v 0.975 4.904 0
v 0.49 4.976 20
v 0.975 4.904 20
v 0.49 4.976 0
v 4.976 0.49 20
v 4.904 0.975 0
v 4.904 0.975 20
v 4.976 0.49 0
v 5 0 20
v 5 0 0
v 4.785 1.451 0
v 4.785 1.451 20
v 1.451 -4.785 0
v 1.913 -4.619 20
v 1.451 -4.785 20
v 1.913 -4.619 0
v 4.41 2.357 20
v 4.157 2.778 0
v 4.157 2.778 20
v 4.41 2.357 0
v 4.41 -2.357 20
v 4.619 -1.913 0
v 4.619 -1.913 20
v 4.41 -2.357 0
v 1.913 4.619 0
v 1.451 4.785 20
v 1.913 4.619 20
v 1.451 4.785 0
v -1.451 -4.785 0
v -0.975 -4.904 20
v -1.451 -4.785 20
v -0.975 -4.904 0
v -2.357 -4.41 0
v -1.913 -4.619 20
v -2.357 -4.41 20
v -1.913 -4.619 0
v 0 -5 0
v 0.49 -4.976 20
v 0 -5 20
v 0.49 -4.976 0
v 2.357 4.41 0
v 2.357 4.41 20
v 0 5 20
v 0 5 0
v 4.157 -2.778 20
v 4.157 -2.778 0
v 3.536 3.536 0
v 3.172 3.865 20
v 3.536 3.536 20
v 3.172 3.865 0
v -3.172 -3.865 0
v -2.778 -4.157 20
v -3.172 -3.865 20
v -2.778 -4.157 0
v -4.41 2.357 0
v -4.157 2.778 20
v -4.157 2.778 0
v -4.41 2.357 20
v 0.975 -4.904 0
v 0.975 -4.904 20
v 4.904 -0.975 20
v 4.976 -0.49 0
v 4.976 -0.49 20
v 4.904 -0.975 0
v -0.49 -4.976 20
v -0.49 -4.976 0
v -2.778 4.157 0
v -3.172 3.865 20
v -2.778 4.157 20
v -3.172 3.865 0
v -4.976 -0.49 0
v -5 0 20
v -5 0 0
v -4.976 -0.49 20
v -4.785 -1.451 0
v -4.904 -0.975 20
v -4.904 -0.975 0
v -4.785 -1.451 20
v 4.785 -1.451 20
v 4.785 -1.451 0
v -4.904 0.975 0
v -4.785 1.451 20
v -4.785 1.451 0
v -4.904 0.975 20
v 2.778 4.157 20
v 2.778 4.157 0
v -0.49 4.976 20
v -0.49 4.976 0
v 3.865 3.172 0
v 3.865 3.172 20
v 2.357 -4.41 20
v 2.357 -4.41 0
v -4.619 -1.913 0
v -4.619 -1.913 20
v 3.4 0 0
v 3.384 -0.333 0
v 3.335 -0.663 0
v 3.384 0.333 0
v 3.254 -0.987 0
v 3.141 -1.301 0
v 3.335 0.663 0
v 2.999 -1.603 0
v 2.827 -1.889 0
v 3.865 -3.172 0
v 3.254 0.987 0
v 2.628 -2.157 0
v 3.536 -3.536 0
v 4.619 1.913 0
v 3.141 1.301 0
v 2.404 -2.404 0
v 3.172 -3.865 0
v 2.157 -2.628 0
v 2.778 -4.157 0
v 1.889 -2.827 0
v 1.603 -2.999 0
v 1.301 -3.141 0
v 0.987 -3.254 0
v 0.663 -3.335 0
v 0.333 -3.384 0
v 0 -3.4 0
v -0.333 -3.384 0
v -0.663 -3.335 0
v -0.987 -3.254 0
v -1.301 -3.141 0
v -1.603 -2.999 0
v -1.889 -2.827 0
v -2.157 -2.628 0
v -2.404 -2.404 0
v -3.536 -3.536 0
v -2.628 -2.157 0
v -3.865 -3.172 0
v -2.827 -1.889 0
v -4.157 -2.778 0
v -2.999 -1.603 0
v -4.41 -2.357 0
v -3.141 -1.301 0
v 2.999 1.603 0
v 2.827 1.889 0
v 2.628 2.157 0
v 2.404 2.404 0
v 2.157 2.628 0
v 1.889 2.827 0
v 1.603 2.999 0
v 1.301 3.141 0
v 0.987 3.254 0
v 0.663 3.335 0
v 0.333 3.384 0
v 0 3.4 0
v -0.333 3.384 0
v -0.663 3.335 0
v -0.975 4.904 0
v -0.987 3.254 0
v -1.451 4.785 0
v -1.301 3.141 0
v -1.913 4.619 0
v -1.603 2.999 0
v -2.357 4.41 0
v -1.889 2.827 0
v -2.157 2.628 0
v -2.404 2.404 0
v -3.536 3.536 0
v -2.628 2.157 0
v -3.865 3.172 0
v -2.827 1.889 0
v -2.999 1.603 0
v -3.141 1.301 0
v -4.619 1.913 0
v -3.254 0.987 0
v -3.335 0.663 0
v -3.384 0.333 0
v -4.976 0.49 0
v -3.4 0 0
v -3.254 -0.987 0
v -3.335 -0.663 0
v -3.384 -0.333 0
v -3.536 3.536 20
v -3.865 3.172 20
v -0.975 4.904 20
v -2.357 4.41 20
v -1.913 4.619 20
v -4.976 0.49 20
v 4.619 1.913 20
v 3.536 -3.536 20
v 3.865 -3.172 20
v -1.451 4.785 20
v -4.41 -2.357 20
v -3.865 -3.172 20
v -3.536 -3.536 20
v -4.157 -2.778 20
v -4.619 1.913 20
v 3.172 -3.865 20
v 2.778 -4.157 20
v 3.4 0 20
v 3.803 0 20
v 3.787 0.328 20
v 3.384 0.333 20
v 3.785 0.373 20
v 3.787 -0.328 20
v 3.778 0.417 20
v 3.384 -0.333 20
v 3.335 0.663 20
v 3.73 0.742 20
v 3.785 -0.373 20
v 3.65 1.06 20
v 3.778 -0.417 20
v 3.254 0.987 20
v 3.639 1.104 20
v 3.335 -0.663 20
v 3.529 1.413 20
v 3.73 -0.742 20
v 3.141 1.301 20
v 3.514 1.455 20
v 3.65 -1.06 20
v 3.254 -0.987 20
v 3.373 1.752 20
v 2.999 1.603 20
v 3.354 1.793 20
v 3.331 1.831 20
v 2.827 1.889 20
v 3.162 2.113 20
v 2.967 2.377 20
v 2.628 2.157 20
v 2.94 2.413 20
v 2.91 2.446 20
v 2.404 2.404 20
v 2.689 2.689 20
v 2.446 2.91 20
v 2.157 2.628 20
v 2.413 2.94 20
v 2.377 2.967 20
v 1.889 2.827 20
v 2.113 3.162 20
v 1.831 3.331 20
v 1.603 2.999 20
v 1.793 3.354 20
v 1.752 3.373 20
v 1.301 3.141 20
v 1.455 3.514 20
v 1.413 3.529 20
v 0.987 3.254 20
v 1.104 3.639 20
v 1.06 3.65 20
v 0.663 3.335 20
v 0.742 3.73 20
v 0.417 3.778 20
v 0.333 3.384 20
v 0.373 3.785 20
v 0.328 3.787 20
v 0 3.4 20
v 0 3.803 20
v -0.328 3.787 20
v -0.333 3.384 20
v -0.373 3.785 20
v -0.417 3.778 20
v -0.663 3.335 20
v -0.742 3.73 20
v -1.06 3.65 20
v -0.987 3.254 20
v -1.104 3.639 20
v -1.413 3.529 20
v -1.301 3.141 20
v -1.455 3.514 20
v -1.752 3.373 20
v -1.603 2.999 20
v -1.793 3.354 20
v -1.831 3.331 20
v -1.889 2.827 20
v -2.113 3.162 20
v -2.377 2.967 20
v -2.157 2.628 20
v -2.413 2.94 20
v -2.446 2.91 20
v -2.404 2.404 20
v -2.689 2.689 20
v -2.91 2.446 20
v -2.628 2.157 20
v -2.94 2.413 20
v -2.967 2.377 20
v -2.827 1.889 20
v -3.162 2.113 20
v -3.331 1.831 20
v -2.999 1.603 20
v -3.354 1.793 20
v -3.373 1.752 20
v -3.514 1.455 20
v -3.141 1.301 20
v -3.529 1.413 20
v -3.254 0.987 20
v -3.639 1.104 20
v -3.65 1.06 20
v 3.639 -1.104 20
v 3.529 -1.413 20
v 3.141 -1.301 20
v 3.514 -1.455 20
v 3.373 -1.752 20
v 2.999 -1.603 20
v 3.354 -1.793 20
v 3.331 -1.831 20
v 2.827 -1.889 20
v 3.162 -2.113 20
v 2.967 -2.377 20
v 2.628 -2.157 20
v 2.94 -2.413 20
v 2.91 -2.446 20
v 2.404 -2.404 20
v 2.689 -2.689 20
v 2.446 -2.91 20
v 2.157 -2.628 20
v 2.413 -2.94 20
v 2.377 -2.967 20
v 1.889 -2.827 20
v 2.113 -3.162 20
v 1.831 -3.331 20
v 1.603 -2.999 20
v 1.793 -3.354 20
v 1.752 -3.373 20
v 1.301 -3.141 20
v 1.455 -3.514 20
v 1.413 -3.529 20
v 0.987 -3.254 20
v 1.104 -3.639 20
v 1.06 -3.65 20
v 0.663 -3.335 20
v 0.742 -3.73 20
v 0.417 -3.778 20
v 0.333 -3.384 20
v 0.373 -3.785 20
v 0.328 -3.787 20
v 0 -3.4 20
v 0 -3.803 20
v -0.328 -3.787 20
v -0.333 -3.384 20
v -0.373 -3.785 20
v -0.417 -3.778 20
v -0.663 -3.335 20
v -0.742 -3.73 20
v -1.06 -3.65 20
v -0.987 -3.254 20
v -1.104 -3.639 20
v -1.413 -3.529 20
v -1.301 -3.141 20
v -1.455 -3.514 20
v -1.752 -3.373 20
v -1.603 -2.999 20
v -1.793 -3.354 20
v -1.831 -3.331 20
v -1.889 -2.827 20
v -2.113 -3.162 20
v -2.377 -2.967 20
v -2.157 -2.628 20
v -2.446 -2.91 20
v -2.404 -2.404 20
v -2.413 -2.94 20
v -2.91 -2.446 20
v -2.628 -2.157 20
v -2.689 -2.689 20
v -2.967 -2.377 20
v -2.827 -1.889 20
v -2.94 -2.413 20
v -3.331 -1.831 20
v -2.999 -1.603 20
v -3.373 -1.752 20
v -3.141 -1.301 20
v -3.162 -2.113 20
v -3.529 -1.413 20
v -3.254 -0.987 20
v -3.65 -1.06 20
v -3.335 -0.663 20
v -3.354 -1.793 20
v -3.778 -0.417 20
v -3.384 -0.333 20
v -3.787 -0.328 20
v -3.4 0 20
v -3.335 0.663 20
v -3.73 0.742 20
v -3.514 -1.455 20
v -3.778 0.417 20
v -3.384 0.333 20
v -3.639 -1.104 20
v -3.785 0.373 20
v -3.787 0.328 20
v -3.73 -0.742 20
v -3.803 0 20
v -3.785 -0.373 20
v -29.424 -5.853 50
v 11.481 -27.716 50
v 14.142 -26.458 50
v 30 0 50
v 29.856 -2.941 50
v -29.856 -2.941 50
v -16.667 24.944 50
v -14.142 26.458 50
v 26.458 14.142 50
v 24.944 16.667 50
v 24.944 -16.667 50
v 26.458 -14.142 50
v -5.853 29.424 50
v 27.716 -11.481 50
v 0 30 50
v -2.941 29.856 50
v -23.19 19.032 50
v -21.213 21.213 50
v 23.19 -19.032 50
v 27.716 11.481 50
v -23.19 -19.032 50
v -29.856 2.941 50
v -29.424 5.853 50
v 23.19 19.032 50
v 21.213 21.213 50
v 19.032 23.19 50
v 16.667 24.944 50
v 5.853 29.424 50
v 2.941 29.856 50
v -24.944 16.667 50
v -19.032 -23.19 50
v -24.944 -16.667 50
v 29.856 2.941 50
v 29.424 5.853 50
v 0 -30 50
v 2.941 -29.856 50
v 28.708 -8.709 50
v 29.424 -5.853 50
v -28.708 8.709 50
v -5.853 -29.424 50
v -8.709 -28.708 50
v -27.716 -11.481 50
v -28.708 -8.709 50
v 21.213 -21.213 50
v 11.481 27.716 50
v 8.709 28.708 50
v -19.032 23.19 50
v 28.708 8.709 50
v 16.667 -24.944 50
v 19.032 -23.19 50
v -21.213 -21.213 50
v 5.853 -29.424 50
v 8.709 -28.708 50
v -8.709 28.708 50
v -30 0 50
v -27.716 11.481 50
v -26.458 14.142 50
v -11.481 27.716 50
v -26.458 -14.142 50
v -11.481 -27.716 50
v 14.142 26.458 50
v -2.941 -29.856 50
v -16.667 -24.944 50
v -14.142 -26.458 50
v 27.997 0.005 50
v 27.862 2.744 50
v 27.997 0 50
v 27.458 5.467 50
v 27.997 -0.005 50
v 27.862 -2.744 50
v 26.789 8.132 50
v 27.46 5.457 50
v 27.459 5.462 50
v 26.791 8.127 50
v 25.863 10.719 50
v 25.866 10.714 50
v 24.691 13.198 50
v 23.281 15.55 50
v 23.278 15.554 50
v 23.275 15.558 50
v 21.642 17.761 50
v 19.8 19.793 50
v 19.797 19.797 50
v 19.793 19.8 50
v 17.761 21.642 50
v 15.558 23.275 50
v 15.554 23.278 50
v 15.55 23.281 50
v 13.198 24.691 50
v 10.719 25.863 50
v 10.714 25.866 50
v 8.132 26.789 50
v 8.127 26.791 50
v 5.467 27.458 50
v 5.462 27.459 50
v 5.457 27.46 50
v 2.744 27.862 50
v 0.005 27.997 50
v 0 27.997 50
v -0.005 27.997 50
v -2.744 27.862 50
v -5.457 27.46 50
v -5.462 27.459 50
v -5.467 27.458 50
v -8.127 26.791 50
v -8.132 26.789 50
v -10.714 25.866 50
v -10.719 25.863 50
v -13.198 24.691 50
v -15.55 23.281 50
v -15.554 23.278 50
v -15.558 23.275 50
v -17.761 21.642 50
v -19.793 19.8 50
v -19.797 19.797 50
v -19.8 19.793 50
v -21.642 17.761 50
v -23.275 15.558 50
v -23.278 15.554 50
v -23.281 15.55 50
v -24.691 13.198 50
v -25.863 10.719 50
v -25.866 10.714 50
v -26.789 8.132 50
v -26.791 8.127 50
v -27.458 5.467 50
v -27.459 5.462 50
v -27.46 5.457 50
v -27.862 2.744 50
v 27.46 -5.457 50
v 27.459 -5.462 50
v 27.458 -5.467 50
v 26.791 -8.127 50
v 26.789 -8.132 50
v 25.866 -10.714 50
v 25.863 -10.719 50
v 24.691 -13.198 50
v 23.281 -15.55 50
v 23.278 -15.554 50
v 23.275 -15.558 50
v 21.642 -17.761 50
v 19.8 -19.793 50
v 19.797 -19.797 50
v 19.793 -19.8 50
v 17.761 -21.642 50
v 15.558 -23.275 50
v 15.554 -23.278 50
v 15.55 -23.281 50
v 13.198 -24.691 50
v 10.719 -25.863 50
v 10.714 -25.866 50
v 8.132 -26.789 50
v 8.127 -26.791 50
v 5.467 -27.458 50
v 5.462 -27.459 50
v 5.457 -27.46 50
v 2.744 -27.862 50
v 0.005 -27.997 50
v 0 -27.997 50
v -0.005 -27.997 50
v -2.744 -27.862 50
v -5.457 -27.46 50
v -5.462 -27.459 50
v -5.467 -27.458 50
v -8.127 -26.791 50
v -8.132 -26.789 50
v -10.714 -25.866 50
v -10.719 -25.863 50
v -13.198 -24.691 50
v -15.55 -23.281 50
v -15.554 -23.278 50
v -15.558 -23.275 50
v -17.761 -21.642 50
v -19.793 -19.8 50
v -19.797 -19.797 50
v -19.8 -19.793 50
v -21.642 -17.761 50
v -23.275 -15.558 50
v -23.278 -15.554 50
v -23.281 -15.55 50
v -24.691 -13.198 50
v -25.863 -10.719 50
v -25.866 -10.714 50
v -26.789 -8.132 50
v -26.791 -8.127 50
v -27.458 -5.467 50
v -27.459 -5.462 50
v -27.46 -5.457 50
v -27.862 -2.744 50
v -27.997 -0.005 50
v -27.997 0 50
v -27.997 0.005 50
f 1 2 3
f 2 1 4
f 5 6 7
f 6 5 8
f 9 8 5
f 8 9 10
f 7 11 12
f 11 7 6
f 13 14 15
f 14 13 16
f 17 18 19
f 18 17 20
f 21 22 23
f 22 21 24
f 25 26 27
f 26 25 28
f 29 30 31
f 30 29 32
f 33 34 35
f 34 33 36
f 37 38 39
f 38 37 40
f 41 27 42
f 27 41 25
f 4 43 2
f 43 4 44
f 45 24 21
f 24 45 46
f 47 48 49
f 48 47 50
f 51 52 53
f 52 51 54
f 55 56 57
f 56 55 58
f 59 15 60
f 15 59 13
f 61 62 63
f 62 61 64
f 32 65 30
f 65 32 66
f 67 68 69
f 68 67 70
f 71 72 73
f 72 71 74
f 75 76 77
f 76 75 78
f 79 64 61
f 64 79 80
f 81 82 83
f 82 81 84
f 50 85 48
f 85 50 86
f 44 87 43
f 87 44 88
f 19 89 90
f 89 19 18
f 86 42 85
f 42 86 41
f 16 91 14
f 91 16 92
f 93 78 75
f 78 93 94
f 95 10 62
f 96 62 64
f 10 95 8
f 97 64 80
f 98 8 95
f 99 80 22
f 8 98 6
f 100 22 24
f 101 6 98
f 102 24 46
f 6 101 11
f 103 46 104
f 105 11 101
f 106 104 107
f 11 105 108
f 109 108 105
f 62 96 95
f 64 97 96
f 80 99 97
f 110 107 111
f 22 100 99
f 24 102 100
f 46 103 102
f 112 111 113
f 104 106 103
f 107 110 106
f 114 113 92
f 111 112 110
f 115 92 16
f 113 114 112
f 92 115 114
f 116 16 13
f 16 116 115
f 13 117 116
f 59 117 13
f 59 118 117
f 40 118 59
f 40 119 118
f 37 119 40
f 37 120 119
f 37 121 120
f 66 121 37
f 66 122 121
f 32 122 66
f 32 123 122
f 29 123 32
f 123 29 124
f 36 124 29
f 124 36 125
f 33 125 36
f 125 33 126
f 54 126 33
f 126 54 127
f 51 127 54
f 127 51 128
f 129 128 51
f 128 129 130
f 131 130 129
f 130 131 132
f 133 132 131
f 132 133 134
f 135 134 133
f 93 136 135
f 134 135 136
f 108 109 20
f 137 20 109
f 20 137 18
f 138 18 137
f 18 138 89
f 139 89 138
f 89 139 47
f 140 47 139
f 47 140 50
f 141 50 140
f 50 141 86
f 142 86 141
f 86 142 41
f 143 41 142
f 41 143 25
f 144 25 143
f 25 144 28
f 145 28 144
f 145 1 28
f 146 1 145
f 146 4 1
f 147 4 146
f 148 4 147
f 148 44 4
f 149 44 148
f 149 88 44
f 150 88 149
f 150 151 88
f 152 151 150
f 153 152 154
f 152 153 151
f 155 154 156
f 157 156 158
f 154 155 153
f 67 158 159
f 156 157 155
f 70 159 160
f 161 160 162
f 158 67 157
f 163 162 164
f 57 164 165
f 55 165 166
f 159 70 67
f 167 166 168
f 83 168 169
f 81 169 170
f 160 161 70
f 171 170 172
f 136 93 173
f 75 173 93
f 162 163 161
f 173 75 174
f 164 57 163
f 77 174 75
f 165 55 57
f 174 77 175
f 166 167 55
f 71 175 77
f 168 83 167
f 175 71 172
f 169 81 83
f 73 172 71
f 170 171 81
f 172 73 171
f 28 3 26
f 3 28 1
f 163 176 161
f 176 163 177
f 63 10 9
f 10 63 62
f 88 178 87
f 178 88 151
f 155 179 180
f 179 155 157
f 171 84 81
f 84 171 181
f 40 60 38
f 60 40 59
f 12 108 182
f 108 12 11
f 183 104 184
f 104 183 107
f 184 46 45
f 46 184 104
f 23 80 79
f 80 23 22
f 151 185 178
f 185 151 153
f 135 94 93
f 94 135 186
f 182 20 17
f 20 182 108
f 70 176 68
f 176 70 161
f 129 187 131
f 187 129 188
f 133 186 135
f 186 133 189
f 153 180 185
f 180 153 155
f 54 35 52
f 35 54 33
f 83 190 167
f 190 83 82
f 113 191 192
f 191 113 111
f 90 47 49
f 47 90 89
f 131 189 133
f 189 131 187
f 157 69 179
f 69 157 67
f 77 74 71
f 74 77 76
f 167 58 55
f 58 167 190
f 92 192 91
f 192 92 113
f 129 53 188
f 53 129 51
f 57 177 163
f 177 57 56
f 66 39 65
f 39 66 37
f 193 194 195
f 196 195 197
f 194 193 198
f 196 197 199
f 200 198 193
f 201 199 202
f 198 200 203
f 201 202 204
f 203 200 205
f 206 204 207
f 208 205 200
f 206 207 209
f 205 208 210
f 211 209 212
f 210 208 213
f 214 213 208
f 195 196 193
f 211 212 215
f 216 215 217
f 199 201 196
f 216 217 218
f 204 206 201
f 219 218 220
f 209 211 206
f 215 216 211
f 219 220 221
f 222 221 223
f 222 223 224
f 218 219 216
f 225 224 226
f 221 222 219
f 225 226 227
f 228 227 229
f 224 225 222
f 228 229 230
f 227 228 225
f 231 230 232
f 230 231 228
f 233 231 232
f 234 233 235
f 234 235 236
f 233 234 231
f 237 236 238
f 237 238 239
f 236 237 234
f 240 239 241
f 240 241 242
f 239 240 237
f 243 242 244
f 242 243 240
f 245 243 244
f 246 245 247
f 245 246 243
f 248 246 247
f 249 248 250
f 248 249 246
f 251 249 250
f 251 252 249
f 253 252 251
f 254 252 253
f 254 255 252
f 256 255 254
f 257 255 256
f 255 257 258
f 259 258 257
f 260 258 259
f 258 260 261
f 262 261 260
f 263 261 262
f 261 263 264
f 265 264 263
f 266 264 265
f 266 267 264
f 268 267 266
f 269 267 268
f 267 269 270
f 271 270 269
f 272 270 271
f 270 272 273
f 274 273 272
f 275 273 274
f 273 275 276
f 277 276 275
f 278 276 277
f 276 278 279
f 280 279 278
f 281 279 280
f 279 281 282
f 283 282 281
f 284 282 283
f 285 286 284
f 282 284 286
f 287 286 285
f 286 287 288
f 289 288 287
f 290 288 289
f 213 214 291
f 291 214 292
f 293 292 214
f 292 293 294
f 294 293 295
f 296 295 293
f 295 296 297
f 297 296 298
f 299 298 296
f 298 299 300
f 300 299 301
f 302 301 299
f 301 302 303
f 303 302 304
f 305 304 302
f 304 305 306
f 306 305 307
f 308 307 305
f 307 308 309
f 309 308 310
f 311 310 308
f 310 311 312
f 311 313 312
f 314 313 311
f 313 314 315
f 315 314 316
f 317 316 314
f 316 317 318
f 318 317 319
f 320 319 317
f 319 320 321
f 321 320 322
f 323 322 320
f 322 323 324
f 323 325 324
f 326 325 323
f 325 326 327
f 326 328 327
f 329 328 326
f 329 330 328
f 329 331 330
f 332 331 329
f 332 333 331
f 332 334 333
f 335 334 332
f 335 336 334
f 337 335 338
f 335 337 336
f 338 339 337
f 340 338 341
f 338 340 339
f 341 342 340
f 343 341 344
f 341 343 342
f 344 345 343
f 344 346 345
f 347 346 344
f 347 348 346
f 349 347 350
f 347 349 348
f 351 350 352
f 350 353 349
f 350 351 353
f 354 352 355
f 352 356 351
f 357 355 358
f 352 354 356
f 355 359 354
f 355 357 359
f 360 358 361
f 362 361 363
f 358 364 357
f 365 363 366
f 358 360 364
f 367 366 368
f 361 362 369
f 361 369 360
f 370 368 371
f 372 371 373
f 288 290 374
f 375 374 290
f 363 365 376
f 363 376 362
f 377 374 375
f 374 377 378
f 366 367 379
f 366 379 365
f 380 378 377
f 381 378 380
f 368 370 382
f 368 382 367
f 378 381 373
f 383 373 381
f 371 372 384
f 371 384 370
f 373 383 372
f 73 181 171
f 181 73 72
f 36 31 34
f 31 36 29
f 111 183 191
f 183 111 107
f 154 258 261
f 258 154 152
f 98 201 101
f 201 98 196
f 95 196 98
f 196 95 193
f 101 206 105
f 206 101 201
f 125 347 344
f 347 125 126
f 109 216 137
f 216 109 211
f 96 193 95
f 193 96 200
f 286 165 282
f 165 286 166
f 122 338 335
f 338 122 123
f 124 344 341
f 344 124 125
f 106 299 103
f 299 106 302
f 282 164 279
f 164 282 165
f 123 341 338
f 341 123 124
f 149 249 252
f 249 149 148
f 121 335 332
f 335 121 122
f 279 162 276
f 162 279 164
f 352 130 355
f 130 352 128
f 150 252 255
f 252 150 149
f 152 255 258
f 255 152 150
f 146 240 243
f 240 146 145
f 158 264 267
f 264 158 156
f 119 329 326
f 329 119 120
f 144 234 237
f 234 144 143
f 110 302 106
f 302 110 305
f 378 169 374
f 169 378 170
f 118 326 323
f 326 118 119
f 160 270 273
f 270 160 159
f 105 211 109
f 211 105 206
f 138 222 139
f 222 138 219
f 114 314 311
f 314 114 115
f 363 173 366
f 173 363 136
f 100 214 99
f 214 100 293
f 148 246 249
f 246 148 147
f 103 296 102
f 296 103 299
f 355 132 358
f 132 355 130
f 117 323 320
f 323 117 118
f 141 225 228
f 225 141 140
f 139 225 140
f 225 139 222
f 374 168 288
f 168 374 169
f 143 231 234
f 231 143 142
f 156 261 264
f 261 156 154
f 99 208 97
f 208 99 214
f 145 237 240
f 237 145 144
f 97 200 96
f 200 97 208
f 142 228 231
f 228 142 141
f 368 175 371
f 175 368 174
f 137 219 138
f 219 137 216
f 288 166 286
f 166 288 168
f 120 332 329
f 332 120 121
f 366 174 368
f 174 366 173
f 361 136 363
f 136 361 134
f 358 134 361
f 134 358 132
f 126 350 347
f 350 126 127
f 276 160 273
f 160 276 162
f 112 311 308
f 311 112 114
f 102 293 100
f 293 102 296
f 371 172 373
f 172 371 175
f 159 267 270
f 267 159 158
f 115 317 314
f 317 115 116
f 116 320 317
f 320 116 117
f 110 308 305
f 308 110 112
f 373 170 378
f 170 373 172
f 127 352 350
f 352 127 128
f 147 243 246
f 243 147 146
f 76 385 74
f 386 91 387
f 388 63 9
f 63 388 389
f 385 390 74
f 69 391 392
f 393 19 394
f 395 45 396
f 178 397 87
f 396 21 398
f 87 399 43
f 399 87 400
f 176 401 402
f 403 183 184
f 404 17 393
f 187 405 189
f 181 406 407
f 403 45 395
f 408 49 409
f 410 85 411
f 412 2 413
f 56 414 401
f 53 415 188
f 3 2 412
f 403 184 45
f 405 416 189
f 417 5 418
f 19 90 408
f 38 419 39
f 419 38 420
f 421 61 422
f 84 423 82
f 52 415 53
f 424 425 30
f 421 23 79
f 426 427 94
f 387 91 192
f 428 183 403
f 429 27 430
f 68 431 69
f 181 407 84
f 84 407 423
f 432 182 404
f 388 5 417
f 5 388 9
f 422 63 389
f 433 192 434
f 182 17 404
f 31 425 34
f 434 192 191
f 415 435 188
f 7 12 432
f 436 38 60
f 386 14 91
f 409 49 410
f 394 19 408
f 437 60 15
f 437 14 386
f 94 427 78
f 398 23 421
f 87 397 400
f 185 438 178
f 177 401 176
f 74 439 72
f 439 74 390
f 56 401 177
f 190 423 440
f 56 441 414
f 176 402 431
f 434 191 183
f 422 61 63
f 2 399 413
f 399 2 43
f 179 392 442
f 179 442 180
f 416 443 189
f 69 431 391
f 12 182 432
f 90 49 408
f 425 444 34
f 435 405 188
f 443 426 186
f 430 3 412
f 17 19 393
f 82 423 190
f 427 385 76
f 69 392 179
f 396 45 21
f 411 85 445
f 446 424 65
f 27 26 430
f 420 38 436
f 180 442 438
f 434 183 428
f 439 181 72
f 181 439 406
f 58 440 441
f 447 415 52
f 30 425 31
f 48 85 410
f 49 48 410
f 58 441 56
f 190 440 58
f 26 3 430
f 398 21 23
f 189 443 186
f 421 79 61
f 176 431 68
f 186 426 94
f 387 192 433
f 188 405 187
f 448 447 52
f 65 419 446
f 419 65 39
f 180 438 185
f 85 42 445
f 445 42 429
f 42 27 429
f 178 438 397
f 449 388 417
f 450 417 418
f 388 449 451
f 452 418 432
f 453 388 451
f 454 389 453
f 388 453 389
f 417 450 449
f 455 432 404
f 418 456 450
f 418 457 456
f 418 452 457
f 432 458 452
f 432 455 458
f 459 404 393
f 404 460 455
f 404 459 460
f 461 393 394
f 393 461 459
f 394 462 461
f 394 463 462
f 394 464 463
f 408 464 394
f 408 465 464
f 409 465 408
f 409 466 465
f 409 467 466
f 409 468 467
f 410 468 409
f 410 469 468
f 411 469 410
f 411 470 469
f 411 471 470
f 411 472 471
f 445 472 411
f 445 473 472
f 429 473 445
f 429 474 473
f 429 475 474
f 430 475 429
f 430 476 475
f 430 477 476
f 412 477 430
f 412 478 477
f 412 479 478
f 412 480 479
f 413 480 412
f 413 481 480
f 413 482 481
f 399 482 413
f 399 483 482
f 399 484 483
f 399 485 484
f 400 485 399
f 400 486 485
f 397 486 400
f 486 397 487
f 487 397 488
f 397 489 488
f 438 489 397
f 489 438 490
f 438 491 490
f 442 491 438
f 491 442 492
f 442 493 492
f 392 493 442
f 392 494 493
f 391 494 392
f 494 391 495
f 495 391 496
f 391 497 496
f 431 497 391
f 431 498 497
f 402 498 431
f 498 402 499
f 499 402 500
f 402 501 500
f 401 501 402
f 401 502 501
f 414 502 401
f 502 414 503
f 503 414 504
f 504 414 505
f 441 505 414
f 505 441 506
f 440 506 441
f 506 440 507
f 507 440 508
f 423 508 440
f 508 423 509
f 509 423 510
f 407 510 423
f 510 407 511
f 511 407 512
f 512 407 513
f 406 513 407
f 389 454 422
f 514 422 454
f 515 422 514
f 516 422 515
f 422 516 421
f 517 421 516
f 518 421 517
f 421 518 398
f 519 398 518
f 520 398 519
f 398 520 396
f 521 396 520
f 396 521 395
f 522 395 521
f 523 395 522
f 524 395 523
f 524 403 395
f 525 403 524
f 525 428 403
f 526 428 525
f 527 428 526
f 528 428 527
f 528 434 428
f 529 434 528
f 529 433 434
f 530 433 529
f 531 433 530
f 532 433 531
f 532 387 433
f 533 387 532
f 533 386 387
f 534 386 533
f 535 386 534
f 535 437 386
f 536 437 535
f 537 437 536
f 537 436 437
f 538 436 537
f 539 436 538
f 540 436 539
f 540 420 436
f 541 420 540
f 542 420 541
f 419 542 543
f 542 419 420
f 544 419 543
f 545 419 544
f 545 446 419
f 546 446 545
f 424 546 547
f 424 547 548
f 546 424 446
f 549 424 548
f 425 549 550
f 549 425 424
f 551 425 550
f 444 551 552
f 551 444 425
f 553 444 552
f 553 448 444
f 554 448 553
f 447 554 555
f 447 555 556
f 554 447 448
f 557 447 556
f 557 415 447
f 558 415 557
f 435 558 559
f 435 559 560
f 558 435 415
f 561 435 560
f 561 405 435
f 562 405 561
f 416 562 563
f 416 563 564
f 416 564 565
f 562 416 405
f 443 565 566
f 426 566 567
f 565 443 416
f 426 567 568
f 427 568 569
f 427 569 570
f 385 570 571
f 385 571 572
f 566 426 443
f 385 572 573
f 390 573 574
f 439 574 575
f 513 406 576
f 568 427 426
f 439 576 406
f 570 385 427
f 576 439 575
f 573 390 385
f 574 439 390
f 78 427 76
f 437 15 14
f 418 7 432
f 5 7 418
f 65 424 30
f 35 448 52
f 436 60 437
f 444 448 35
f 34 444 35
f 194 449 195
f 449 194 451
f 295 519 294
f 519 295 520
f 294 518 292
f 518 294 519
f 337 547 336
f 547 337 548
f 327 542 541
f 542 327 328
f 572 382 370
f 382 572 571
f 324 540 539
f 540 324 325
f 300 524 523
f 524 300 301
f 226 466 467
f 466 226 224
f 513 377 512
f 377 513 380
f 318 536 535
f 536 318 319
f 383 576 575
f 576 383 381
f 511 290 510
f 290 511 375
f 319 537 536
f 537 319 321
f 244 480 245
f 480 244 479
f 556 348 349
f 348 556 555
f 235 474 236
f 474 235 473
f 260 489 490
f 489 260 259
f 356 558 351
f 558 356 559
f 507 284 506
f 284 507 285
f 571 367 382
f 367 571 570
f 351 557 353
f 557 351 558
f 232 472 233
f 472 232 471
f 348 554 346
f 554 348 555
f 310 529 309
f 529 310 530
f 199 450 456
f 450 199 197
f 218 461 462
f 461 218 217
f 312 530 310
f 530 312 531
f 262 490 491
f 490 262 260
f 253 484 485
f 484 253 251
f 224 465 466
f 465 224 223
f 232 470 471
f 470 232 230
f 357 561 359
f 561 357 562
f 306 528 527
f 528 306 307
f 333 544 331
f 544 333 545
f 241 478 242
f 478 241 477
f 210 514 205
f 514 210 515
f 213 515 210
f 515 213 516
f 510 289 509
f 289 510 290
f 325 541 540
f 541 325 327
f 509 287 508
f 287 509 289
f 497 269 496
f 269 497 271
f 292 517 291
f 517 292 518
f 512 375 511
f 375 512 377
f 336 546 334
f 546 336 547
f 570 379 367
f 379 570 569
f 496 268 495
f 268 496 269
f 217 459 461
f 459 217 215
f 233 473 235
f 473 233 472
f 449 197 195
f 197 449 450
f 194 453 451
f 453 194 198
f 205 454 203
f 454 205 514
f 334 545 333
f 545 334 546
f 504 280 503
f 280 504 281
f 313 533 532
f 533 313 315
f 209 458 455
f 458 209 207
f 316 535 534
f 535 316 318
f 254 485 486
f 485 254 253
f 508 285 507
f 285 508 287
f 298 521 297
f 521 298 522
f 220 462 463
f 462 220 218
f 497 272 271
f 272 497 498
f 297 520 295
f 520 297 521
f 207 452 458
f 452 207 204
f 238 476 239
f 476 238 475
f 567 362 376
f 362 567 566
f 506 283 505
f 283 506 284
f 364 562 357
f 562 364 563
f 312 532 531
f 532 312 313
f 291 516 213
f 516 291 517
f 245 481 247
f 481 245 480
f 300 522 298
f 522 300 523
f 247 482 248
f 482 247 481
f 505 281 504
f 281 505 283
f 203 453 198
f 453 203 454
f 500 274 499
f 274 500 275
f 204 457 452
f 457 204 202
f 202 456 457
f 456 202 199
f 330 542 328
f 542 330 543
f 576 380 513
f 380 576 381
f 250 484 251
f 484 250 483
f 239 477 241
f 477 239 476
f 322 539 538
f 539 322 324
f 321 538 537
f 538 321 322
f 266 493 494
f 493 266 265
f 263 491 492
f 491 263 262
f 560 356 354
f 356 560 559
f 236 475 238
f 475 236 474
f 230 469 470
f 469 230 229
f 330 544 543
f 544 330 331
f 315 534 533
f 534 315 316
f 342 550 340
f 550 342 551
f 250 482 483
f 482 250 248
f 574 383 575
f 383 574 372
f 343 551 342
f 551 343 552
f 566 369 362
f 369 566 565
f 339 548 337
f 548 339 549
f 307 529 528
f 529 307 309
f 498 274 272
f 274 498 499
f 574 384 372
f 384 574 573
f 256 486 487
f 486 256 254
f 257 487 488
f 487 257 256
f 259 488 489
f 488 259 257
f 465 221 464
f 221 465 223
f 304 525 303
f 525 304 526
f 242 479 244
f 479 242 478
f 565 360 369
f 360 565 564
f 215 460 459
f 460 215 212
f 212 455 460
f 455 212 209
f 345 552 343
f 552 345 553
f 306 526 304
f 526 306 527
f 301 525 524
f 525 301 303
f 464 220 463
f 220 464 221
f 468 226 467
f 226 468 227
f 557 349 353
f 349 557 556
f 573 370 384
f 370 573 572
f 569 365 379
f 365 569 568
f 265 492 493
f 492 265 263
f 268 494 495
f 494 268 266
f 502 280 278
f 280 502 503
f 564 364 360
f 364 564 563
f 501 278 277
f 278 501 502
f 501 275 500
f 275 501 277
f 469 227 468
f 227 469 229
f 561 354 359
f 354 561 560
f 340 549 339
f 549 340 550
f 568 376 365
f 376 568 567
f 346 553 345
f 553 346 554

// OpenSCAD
// Funnel with spout - printed upright, wide opening at the top
// Units: mm. Straight spout (tube) from z = 0 to z = 20, then a cone
// widens to the rim at z = 50. Wall 1.6 mm thick. Open top and bottom.

$fn = 64;

// ---- Dimensions ----
spout_od      = 10;    // spout outer diameter
spout_length = 20;     // spout length (z = 0 to z = 20)
cone_top_d    = 10;     // cone outer diameter at z = 20 (spout top)
cone_rim_d    = 60;     // cone outer diameter at rim (z = 50)
wall          = 1.6;    // wall thickness everywhere
eps           = 0.5;    // cutter overshoot past faces

// ---- Derived ----
spout_id = spout_od - 2 * wall;   // spout bore (6.8 mm)
cone_r2  = cone_top_d / 2;        // cone radius at z = 20
cone_r3  = cone_rim_d / 2;        // cone radius at z = 50
cone_h   = 50 - 20;               // cone height (30 mm)

// ---- Model ----
union() {
    // Spout: tube 10 mm OD x 20 mm long, open at both ends
    difference() {
        cylinder(h = spout_length, d = spout_od);
        translate([0, 0, -eps])
            cylinder(h = spout_length + 2 * eps, d = spout_id);
    }

    // Cone: frustum from 10 mm OD at z = 20 to 60 mm OD at z = 50,
    // 1.6 mm wall, open at both ends (through the frustum)
    difference() {
        translate([0, 0, 20])
            cylinder(h = cone_h, r1 = cone_r2, r2 = cone_r3);
        translate([0, 0, 19.5])
            cylinder(h = cone_h + 1, r1 = cone_r2 - wall, r2 = cone_r3 - wall);
    }
}
